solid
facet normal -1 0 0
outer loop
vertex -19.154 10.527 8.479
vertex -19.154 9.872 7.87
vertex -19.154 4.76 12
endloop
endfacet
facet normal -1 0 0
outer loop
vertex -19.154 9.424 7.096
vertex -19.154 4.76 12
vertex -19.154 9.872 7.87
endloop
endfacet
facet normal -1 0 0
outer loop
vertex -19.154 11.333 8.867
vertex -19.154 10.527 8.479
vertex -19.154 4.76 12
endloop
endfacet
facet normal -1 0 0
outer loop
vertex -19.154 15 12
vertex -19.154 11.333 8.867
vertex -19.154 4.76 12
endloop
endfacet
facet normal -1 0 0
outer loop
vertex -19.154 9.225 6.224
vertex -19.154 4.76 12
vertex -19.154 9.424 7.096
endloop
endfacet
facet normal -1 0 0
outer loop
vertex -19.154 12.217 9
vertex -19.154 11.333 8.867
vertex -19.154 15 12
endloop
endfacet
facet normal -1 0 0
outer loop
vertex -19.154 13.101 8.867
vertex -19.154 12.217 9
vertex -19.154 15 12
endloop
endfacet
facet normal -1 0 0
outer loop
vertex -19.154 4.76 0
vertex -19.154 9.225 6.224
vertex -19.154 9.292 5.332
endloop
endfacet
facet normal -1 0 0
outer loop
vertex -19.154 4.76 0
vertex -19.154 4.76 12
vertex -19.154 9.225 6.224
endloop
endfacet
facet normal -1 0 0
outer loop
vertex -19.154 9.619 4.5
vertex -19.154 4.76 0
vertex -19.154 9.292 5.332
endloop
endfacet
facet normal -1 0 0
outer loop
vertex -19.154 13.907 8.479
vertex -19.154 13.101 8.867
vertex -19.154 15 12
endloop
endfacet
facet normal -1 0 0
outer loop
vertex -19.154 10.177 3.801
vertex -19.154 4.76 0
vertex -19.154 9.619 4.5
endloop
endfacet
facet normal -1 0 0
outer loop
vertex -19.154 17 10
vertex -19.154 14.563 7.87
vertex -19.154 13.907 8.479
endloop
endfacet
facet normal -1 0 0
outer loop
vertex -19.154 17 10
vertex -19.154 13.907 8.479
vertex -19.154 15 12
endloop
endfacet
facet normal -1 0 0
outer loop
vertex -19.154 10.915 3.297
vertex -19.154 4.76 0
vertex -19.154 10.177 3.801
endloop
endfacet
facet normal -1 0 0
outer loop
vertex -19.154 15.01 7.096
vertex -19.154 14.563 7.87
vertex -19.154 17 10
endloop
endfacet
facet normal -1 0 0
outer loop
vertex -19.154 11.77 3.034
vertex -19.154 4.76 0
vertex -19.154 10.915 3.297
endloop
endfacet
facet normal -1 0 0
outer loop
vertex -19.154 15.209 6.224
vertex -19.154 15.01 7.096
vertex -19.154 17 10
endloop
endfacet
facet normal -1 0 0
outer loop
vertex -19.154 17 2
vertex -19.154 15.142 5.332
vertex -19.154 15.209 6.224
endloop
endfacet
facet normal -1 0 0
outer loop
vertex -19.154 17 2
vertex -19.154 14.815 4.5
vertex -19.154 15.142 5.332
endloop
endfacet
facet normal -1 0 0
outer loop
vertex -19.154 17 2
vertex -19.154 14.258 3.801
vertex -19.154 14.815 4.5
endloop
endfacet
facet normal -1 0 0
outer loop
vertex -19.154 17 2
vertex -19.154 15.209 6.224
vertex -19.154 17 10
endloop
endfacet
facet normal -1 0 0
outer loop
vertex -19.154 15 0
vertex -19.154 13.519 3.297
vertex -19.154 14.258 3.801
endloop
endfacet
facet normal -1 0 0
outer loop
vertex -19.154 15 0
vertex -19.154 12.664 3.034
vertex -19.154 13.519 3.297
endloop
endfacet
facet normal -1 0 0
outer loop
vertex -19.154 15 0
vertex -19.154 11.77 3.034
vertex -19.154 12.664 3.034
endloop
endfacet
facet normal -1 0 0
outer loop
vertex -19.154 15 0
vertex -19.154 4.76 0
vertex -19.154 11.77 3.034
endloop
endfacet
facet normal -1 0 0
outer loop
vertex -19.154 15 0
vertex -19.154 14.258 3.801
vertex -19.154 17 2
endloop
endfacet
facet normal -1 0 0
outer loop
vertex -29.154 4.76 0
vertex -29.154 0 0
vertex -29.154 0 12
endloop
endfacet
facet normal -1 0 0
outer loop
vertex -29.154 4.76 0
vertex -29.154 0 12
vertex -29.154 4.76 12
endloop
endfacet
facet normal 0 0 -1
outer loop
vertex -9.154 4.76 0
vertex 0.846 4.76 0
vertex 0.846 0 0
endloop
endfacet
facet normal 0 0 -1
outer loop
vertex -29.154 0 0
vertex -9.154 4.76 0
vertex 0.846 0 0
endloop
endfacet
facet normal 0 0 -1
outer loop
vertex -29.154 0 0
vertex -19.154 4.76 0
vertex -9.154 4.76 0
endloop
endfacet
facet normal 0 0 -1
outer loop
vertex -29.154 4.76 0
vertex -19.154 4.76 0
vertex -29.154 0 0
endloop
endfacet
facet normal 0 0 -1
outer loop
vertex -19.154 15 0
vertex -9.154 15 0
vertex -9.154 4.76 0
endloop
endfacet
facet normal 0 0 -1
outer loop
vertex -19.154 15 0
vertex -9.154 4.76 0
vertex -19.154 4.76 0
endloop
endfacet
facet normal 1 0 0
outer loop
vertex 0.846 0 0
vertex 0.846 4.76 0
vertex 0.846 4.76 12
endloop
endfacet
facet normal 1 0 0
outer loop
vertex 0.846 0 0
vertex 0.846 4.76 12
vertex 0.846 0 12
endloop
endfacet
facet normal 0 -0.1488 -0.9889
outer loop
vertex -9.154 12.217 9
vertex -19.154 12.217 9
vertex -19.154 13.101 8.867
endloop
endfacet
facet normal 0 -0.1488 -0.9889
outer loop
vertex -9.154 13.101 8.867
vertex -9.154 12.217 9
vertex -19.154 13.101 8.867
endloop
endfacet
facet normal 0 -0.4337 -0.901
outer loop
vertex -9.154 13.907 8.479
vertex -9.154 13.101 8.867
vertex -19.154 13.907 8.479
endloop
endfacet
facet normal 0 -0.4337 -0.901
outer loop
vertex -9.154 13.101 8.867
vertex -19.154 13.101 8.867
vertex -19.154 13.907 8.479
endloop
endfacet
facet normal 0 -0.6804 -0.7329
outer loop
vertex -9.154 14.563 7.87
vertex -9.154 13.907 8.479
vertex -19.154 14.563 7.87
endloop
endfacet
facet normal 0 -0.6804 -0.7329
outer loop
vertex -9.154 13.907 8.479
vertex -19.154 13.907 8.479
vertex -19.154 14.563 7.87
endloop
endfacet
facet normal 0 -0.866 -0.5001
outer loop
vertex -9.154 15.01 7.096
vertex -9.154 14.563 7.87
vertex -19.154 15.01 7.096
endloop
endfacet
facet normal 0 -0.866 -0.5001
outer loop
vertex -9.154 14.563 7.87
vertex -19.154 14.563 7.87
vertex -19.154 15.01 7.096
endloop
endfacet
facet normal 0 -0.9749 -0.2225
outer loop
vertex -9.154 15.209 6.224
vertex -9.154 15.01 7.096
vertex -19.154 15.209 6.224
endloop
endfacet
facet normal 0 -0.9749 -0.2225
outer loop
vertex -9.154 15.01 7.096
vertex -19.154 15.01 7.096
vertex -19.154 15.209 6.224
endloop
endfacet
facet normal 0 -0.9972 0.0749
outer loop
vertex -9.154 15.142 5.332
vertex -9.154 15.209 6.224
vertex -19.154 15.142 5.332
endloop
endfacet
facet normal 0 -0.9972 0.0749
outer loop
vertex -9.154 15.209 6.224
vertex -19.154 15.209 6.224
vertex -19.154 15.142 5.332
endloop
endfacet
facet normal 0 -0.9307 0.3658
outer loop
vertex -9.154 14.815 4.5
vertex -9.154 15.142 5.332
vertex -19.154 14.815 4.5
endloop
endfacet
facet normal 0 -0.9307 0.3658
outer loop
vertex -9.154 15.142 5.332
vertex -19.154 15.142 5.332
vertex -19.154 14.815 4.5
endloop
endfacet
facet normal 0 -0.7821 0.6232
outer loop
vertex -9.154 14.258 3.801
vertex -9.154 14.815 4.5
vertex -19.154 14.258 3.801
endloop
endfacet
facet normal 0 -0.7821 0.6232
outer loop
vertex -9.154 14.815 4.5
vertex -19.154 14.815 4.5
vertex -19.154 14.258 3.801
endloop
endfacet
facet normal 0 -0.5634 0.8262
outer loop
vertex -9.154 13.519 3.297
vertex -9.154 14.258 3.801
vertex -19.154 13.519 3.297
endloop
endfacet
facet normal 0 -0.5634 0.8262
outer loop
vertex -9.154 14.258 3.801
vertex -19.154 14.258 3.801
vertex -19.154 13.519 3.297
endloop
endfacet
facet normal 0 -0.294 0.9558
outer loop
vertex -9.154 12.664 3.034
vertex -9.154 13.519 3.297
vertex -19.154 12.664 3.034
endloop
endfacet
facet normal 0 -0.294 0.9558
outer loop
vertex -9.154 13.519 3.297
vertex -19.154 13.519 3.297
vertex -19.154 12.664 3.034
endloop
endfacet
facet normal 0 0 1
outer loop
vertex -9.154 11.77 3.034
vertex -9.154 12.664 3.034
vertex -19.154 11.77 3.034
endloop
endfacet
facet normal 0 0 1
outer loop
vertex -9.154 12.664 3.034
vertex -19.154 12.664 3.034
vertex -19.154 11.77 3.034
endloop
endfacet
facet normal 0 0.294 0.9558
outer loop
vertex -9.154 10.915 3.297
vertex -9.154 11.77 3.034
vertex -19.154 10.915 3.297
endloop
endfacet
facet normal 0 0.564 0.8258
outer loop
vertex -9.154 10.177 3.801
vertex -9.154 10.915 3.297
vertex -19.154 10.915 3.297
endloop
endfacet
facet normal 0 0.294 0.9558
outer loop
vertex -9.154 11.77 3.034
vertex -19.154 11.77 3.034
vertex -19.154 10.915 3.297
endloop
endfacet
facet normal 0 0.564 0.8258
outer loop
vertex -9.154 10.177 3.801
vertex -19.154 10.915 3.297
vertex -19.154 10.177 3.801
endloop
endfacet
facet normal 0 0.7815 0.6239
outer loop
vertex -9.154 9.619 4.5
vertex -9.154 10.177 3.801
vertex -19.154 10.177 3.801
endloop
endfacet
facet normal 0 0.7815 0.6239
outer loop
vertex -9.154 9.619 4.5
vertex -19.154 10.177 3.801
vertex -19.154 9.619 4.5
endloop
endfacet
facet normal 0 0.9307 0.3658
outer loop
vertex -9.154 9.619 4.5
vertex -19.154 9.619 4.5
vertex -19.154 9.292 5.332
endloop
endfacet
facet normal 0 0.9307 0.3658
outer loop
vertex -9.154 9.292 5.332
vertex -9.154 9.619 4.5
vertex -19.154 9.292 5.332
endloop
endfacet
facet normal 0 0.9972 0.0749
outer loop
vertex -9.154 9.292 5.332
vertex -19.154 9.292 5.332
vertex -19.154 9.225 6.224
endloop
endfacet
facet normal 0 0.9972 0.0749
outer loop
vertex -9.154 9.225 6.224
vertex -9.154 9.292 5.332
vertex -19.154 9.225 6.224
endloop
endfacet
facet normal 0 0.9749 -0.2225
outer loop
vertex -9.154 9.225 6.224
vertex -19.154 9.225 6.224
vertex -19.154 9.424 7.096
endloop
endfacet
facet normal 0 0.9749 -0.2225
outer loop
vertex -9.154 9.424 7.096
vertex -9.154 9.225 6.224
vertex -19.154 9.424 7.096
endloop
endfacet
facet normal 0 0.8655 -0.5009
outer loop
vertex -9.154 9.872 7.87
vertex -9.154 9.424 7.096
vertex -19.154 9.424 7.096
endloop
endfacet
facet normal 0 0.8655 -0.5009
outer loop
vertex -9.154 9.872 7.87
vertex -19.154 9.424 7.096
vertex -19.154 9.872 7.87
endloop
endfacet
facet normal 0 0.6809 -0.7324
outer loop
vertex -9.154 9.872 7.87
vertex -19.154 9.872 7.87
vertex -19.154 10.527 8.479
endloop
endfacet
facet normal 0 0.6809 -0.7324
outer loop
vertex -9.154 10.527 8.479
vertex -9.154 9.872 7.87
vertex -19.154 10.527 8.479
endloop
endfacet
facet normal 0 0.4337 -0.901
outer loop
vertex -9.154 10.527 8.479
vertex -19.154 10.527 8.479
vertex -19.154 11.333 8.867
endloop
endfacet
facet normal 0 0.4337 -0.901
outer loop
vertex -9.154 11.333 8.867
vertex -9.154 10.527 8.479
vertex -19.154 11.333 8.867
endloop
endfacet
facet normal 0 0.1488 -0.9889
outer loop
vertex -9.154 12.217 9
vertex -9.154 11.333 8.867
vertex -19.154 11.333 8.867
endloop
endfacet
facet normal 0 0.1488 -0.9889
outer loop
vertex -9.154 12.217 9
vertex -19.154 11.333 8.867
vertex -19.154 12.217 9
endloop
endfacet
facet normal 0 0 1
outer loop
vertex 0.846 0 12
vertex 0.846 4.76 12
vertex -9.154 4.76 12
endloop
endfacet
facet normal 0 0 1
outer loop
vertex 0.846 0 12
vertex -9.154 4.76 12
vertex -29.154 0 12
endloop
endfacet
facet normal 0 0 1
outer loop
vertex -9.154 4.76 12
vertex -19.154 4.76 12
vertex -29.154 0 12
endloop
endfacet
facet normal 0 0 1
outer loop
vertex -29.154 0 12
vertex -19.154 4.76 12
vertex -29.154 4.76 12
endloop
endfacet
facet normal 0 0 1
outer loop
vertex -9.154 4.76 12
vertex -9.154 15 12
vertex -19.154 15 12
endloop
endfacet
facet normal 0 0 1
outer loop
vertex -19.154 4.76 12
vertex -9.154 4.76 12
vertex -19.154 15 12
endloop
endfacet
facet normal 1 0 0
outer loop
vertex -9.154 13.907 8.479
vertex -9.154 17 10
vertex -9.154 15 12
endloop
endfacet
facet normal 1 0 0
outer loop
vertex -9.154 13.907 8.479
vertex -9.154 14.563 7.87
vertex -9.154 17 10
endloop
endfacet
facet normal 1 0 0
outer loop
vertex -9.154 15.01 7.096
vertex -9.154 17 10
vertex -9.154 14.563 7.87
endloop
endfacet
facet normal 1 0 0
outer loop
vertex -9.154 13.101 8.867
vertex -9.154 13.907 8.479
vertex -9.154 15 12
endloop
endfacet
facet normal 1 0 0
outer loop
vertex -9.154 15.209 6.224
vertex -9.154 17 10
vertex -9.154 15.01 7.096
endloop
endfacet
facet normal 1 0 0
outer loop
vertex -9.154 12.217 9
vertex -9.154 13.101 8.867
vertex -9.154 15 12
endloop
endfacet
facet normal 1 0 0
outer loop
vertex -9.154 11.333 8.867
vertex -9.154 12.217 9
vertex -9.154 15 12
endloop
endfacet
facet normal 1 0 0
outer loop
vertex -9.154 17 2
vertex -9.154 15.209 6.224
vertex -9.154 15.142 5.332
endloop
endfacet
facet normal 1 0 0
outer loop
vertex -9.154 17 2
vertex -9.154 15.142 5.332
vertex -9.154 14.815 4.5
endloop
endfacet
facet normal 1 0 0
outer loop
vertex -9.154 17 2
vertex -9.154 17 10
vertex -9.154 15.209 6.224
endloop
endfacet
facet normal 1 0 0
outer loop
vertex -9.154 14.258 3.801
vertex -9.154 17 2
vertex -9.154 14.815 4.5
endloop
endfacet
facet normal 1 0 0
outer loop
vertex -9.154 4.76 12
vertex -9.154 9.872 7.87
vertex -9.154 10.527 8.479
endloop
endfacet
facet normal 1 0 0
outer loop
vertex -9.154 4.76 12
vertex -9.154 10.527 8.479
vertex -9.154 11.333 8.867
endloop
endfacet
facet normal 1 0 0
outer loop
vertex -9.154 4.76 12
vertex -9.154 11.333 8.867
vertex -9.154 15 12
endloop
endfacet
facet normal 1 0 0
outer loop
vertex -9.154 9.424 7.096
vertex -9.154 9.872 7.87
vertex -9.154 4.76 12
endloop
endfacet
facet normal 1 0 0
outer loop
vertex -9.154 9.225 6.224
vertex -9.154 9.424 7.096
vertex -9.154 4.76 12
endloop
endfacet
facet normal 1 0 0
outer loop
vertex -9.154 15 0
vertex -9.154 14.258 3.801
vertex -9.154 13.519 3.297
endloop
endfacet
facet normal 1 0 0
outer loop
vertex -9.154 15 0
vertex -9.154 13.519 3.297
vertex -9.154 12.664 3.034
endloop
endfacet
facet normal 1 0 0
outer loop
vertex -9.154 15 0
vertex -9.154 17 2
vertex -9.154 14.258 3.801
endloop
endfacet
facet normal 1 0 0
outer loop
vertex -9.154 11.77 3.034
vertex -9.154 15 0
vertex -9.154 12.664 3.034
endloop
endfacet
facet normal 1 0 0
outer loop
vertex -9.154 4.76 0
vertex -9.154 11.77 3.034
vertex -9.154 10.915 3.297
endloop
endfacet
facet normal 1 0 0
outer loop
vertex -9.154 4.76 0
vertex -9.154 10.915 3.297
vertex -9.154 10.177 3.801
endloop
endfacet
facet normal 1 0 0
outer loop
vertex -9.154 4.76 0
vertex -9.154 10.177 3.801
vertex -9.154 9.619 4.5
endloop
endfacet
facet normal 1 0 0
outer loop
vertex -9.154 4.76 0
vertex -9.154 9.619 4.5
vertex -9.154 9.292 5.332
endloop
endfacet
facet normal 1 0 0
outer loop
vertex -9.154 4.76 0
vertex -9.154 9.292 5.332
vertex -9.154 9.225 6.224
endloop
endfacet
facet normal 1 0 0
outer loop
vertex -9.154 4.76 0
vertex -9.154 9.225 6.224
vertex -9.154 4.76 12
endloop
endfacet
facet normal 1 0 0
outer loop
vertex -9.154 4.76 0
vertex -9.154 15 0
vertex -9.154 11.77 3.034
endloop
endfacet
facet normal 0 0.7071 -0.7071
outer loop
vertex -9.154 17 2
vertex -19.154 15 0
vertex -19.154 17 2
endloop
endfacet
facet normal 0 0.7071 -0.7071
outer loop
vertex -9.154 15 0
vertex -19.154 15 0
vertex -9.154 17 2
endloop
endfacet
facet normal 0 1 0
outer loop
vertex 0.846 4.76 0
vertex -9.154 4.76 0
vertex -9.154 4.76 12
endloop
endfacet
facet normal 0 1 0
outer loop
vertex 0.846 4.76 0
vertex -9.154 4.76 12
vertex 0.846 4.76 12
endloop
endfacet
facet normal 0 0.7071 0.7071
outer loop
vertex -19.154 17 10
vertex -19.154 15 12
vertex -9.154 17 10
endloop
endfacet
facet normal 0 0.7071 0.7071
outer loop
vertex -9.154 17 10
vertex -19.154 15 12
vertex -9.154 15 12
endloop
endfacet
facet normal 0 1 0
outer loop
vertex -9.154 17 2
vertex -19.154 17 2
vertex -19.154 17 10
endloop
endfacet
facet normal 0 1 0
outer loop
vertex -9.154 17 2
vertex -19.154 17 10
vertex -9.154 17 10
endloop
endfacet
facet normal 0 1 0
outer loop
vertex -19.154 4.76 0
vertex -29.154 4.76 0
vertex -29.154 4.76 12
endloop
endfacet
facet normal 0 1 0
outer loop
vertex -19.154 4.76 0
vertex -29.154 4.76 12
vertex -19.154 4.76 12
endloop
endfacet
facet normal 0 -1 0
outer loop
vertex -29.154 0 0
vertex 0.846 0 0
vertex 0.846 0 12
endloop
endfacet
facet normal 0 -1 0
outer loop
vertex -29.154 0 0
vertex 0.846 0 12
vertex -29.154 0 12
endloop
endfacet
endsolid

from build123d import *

# Parameters (mm, degrees)
EXTRUDE_2_DEPTH     = 12
CHAMFER_1_SIZE      = 2
SKETCH_4_R          = 3
CUT_EXTRUDE_4_DEPTH = 29.861739379


with BuildPart() as part:
    # Эскиз2 → Вытянуть2 (new body)
    with BuildSketch(Plane.XY):
        Polygon((0.846446281, 0), (-29.153553719, 0), (-29.153553719, 4.760108812), (-19.153553719, 4.760108812), (-19.153553719, 17), (-9.153553719, 17), (-9.153553719, 4.760108812), (0.846446281, 4.760108812), align=None)
    extrude(amount=EXTRUDE_2_DEPTH)

    # Фаска1
    chamfer_1_edges = [part.edges().sort_by_distance(p)[0] for p in [
        (-14.153553719, 17, 12),
        (-14.153553719, 17, 0),
    ]]
    chamfer(chamfer_1_edges, length=CHAMFER_1_SIZE)

    # Эскиз4 → Вытянуть4 (cut, through all)
    with BuildSketch(Plane.ZY.offset(19.153553719)):
        with Locations((6, 12.217021039)):
            Circle(SKETCH_4_R)
    extrude(amount=-CUT_EXTRUDE_4_DEPTH, mode=Mode.SUBTRACT)


solid = part.part
